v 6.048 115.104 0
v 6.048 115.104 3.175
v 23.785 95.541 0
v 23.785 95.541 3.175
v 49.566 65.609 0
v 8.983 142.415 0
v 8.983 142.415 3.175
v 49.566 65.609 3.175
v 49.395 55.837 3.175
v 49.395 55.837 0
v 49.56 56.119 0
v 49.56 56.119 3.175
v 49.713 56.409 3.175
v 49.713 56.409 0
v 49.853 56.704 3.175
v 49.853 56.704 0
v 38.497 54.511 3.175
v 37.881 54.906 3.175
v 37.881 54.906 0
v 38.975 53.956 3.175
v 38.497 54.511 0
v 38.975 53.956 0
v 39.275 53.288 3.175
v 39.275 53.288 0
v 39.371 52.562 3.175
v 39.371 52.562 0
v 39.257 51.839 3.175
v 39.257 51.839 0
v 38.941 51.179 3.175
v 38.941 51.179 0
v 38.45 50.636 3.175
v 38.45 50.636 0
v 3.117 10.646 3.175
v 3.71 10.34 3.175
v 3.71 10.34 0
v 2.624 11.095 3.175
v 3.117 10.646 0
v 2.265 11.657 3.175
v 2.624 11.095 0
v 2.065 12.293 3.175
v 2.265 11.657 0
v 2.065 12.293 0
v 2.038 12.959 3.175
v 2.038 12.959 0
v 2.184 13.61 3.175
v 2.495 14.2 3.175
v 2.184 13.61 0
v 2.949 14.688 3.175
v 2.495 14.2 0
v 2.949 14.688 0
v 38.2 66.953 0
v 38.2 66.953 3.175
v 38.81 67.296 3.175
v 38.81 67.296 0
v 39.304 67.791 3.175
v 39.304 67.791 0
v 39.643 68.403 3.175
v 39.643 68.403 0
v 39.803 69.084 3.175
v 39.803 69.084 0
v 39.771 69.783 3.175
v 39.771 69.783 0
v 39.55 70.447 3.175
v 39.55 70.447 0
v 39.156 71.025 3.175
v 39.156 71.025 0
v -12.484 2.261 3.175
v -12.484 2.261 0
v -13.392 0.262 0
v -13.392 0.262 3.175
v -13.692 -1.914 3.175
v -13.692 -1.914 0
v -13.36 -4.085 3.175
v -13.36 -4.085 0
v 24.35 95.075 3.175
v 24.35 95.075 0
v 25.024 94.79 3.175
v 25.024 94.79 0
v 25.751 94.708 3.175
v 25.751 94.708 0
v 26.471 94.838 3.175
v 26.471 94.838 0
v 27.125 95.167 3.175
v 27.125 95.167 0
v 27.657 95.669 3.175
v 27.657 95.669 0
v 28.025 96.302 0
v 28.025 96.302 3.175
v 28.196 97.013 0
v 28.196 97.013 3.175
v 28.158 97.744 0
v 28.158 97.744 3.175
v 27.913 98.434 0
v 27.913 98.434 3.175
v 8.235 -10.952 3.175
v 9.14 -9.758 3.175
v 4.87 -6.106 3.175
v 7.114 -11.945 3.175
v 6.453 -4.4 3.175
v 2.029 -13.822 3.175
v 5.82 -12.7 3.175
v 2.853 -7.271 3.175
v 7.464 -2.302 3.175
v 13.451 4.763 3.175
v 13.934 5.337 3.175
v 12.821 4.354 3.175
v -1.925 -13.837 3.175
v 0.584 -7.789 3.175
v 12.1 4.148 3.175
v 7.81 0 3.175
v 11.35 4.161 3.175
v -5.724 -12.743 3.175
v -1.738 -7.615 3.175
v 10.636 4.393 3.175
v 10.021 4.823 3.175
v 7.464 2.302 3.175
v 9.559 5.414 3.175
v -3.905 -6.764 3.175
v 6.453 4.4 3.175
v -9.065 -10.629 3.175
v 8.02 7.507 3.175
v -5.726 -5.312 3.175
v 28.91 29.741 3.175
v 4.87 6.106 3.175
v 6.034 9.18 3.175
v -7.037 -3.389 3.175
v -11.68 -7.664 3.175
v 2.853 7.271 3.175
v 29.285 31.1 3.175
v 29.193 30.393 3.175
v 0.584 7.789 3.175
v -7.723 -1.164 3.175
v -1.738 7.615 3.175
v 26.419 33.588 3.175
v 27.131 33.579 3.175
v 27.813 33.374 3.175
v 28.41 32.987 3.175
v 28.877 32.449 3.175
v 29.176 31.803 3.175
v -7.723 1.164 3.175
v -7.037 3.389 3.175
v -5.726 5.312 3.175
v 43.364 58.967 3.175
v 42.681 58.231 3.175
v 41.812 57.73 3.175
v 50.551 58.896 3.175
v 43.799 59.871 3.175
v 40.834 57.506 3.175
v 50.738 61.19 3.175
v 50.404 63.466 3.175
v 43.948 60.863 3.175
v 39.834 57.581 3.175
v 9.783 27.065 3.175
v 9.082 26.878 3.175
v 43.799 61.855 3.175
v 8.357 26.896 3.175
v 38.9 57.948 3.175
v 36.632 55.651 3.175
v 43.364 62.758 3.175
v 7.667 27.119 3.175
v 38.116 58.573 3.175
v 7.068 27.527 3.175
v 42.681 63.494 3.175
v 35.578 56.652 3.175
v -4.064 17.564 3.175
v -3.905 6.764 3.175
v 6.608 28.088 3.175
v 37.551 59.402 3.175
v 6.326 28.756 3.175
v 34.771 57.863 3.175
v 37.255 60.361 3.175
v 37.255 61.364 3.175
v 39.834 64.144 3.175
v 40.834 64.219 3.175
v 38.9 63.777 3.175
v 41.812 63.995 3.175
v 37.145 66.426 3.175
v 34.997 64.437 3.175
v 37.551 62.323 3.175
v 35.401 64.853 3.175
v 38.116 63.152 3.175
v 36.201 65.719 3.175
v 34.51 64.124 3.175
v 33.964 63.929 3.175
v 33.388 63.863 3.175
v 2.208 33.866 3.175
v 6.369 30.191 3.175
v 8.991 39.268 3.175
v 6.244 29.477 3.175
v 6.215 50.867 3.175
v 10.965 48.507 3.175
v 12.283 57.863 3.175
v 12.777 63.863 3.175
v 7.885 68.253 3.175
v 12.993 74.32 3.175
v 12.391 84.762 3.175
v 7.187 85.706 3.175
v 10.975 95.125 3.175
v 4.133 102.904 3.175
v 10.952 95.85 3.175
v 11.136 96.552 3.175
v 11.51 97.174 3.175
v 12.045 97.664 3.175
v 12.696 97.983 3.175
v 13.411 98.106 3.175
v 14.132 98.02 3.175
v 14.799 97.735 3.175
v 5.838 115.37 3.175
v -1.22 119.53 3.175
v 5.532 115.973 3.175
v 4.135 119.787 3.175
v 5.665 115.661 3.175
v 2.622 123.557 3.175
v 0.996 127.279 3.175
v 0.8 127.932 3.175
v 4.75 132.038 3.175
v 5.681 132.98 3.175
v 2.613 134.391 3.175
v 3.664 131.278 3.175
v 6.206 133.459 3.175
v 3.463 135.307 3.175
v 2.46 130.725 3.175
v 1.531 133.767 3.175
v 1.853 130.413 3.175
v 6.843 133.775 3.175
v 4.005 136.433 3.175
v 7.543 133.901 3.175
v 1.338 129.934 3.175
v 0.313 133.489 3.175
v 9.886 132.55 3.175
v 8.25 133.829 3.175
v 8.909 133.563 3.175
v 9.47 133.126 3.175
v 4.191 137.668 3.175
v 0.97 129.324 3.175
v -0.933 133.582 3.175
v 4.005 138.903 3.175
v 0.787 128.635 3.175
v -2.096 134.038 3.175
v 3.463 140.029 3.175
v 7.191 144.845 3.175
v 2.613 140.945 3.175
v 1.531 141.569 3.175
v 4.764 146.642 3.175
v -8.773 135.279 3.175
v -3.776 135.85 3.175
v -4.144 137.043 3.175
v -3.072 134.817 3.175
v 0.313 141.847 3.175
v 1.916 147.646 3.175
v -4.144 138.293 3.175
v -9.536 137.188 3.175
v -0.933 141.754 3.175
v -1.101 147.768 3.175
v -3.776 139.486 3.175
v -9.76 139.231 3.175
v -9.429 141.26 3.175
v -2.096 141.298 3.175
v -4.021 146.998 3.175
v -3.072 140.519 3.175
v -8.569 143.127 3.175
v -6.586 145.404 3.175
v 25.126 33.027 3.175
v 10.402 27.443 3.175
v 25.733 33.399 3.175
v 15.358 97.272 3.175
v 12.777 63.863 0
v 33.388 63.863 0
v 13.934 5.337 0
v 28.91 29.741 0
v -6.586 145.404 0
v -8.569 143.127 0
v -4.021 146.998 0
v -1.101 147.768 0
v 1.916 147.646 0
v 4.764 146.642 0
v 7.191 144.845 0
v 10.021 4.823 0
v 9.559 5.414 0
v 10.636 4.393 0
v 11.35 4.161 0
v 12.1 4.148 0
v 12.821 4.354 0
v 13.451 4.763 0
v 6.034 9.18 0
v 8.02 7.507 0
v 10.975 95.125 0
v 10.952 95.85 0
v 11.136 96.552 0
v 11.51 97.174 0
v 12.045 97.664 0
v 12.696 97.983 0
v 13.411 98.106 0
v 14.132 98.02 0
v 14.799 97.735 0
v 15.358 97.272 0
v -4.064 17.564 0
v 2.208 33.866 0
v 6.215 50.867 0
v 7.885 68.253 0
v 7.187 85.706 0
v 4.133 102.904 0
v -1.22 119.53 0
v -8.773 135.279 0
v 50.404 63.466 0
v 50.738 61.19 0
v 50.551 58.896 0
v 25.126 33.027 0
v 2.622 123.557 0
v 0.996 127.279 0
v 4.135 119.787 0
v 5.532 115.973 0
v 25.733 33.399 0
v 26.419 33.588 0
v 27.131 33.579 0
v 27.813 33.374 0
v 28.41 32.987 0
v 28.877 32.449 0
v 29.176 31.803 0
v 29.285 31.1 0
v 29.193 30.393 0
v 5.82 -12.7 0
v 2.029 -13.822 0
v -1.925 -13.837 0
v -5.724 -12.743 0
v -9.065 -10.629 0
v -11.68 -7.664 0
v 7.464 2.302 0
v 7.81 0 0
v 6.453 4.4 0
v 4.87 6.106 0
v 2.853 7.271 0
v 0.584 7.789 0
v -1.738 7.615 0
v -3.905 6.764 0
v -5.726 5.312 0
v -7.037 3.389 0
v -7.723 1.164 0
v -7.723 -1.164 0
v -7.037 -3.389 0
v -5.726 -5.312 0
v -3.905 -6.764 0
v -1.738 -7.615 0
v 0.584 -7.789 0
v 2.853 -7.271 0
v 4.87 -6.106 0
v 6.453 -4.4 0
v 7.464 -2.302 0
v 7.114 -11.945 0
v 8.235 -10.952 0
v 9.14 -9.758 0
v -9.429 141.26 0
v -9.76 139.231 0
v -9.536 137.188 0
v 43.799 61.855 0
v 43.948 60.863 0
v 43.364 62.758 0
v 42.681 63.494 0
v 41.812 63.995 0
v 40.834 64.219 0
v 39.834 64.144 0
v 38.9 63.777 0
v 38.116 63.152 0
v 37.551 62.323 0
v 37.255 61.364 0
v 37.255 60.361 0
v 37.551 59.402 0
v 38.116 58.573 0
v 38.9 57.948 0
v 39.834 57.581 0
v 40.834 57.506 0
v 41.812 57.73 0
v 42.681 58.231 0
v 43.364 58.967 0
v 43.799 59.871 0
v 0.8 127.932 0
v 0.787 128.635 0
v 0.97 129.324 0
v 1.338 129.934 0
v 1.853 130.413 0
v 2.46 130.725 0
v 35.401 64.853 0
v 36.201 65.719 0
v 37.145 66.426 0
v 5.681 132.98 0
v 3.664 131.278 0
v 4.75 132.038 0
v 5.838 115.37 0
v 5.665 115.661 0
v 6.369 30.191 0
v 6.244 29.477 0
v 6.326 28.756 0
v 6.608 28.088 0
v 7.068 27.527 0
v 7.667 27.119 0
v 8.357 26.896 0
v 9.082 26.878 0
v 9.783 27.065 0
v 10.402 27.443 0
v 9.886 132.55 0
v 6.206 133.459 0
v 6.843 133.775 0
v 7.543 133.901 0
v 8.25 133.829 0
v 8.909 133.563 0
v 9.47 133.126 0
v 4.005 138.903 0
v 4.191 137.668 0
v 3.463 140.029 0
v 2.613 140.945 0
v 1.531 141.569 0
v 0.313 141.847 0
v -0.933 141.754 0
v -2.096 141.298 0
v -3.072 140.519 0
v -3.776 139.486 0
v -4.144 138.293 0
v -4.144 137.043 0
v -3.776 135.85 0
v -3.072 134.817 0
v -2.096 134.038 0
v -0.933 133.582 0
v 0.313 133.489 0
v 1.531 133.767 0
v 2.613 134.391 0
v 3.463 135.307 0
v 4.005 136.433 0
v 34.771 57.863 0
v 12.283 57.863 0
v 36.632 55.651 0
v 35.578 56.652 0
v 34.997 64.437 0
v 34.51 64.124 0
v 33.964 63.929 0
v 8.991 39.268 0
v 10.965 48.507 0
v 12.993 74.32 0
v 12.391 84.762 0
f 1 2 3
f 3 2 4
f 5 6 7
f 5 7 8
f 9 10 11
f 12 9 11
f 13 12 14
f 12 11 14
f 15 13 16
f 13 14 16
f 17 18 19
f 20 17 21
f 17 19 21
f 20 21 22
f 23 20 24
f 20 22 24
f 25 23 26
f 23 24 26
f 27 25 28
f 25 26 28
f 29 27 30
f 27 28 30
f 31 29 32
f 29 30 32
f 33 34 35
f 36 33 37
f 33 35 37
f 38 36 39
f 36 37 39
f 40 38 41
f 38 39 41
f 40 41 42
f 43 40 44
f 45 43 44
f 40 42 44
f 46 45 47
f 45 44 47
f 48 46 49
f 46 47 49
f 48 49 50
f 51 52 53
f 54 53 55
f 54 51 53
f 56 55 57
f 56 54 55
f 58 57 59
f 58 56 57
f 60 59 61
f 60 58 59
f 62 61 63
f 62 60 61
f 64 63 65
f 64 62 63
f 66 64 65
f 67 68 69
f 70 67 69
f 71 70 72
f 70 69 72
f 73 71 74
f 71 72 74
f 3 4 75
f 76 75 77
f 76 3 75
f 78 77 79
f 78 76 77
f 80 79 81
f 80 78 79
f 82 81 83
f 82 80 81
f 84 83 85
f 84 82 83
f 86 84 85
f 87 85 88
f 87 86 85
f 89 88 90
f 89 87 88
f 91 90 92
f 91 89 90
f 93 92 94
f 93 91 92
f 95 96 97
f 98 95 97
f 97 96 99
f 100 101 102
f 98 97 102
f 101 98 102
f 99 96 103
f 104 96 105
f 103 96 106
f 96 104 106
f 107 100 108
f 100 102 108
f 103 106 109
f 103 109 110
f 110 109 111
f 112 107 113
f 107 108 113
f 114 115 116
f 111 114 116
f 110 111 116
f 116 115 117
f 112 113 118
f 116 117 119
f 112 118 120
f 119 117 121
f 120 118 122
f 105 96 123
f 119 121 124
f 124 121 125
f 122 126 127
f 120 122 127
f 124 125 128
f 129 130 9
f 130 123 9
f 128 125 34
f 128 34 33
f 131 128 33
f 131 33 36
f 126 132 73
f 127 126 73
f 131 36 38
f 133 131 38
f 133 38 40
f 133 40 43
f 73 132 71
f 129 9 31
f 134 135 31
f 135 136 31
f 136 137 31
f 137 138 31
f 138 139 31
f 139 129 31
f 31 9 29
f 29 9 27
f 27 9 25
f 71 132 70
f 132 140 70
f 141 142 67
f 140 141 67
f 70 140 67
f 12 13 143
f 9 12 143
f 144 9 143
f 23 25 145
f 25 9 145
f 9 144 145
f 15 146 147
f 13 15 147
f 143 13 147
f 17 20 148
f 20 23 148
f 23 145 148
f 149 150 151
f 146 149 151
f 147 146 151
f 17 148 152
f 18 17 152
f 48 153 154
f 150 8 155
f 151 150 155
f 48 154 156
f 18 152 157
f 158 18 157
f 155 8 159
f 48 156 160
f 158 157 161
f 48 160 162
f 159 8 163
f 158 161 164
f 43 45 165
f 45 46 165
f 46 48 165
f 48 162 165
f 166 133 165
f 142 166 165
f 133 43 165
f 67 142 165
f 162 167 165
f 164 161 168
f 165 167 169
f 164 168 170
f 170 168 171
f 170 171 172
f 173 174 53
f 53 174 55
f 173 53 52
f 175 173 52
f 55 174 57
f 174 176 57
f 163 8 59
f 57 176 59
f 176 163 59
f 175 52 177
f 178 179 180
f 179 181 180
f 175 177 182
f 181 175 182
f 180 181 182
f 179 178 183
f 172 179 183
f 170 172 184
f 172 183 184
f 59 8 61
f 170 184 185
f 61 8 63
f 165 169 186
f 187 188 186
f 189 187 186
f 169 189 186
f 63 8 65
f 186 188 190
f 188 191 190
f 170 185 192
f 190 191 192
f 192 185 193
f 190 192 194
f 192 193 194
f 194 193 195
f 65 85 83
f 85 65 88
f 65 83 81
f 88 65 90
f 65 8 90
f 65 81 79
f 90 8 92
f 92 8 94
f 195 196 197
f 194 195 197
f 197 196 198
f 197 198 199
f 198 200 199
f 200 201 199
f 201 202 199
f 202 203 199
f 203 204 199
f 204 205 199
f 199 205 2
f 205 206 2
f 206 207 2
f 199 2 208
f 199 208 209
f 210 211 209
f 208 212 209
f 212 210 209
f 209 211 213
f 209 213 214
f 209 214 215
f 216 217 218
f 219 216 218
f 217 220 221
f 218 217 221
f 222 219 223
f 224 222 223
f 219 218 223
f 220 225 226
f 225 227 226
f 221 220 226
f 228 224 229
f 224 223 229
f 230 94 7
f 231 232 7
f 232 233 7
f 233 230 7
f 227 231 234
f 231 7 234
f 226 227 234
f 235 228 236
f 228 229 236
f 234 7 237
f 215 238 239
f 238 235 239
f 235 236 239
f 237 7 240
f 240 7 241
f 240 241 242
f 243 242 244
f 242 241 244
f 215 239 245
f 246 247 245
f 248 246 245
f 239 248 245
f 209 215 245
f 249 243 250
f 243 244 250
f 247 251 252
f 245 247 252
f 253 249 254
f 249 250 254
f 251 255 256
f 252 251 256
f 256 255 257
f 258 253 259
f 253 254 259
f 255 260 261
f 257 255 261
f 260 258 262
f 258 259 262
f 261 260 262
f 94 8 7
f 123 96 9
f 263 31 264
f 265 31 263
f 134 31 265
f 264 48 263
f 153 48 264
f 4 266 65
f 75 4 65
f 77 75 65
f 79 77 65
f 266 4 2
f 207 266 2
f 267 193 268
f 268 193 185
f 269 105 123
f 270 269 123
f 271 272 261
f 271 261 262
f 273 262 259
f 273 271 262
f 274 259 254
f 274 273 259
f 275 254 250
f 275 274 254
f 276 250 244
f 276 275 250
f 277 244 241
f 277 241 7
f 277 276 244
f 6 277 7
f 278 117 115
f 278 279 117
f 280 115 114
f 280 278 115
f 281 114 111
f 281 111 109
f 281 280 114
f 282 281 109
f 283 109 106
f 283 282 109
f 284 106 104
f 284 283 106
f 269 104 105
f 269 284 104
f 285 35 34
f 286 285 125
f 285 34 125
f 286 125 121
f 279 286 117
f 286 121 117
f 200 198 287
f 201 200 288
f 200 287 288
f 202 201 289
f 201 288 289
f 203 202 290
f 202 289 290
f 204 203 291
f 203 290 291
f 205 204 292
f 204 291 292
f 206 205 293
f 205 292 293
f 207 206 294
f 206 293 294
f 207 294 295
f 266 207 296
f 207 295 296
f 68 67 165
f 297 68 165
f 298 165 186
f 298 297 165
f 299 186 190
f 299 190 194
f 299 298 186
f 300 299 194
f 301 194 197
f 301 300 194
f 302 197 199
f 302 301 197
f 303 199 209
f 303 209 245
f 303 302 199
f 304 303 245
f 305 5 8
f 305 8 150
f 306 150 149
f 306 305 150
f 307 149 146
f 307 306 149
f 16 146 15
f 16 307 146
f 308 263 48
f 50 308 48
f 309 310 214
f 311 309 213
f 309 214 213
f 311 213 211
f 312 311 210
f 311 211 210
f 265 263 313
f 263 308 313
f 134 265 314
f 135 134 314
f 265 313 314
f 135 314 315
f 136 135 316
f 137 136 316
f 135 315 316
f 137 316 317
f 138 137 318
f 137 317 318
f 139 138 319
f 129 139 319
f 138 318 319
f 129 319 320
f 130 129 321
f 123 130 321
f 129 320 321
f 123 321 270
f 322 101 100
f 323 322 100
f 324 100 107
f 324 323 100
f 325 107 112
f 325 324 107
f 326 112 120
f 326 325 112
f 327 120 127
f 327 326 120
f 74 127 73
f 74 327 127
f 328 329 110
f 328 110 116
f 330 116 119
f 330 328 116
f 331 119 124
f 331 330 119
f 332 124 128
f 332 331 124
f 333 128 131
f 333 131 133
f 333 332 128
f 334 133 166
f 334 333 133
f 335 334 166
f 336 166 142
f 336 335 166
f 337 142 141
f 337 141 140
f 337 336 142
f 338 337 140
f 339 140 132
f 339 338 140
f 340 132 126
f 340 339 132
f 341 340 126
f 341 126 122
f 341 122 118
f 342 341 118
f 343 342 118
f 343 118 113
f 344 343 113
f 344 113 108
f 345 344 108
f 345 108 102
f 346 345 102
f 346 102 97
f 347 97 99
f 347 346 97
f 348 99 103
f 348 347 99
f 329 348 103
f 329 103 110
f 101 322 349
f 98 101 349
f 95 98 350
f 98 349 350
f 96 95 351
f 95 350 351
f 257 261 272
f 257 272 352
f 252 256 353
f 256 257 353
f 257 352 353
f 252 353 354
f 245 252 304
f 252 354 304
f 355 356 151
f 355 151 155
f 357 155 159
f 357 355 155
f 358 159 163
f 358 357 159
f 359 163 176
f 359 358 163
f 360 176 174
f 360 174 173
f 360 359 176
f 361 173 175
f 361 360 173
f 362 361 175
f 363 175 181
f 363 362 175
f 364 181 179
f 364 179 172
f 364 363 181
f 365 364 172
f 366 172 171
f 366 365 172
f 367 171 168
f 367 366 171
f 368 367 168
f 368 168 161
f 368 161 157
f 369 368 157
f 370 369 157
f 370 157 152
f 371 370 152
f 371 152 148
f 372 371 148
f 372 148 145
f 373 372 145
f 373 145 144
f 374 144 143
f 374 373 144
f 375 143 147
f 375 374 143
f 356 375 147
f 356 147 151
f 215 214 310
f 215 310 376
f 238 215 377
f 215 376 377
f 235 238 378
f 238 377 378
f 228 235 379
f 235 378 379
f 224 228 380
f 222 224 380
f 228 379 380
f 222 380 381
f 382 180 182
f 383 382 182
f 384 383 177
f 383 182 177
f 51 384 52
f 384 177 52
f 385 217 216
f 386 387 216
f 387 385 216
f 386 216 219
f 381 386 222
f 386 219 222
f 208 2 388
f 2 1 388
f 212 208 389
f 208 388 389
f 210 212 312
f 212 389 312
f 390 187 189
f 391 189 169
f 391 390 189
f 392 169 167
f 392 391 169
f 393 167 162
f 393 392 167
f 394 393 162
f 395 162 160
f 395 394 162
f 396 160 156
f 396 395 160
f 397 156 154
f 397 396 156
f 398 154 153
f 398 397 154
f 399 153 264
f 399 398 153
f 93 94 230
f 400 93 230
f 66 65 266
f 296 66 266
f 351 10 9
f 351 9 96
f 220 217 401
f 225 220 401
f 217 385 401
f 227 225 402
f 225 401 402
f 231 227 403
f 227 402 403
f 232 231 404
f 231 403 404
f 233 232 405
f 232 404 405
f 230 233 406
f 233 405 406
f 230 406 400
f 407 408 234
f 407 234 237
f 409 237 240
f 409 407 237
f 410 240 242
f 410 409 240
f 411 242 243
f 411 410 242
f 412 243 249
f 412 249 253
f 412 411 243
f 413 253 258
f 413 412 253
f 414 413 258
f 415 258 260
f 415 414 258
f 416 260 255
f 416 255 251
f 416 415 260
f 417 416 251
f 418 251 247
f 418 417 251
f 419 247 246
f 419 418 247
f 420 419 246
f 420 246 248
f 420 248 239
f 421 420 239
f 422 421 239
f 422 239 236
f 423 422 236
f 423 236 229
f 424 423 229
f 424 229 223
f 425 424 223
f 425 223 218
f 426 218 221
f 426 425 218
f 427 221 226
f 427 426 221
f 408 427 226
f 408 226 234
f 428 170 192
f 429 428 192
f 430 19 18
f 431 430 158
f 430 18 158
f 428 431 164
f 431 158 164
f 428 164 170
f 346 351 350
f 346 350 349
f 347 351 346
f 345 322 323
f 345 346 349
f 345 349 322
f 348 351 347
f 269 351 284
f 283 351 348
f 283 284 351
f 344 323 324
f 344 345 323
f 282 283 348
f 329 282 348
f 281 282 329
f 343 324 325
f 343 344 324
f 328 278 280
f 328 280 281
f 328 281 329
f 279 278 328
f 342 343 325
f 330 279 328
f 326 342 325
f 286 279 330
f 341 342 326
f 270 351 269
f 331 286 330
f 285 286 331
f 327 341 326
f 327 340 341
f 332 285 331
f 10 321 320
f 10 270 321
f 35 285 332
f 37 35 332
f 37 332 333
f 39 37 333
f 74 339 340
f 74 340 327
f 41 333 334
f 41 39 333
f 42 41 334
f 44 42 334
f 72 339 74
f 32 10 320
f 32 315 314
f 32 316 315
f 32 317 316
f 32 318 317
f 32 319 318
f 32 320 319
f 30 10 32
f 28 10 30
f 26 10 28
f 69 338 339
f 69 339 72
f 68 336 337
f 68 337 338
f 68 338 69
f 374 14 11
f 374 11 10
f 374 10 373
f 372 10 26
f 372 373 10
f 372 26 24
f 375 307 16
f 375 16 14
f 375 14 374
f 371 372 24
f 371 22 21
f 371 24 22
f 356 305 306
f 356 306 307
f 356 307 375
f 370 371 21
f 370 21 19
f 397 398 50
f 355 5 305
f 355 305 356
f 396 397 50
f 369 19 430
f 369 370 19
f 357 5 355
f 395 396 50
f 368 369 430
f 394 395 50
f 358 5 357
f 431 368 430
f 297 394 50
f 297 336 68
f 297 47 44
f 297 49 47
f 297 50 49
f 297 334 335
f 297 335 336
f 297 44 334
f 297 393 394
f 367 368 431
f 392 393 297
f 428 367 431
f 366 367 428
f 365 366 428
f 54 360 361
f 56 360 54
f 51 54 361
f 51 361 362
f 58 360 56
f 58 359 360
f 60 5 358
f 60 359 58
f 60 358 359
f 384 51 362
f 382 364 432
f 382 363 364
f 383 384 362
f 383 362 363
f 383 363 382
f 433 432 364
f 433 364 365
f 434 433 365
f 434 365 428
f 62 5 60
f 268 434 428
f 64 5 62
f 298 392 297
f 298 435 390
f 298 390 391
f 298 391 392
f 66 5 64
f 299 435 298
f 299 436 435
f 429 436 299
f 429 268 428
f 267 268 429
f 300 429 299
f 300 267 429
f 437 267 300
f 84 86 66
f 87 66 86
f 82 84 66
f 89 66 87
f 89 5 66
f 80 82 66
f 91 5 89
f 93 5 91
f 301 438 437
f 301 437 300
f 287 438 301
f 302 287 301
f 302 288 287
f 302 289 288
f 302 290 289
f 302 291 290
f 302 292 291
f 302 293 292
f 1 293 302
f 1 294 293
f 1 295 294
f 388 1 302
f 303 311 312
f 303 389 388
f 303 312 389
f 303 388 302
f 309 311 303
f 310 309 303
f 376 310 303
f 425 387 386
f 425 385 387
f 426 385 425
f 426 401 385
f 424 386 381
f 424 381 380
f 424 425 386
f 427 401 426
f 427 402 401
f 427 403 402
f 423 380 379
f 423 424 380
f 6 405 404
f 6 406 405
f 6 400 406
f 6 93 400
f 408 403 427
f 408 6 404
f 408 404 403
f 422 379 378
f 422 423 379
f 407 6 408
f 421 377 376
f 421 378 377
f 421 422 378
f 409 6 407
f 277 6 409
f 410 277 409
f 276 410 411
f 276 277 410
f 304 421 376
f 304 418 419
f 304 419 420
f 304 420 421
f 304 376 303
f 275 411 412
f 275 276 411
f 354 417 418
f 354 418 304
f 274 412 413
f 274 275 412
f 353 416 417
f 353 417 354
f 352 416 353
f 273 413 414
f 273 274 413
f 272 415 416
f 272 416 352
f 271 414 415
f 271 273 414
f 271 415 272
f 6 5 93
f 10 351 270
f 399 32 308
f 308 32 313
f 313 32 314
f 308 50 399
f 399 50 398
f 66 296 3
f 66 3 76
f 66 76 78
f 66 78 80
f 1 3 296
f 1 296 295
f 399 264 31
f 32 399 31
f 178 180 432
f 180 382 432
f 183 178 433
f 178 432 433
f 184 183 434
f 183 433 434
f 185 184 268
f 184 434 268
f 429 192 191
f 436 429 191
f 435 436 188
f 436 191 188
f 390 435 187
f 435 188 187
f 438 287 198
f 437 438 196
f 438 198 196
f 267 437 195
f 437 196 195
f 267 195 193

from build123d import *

# Parameters (mm, degrees)
SKETCH1_R           = 7.8105
SKETCH1_R_2         = 3.3655
SKETCH1_R_3         = 4.191
BOSS_EXTRUDE1_DEPTH = 3.175
CUT_EXTRUDE1_DEPTH  = 6.35
FILLET1_R           = 2.54
FILLET5_R           = 7.62


with BuildPart() as part:
    # Sketch1 → Boss-Extrude1 (new body)
    with BuildSketch(Plane.XY):
        with BuildLine():
            Line((8.98309661, 142.414532976), (49.565953559, 65.609056962))
            ThreePointArc((49.565953559, 65.609056962), (50.742856949, 60.862523985), (49.565953559, 56.115991009))
            Line((49.565953559, 56.115991009), (8.177790267, -11.326281223))
            ThreePointArc((8.177790267, -11.326281223), (-6.360706327, -12.437938536), (-13.97, 0))
            ThreePointArc((-13.97, 0), (7.886144716, 68.281846548), (-10.16, 137.668))
            ThreePointArc((-10.16, 137.668), (-2.445131739, 147.529385845), (8.98309661, 142.414532976))
        make_face()
        Circle(SKETCH1_R, mode=Mode.SUBTRACT)
        with Locations((40.582856949, 60.862523985)):
            Circle(SKETCH1_R_2, mode=Mode.SUBTRACT)
        with Locations((0, 137.668)):
            Circle(SKETCH1_R_3, mode=Mode.SUBTRACT)
    extrude(amount=BOSS_EXTRUDE1_DEPTH)

    # Sketch2 → Cut-Extrude1 (cut)
    with BuildSketch(Plane.XY.offset(3.175)):
        with BuildLine():
            ThreePointArc((-1.687172275, 10.855167431), (6.949528794, 8.507952738), (10.973487677, 0.513593659))
            Line((10.973487677, 0.513593659), (36.90141673, 42.763317023))
            Line((36.90141673, 42.763317023), (-1.687172275, 10.855167431))
        make_face()
        with BuildLine():
            ThreePointArc((12.283170574, 57.862523985), (9.009504683, 39.343064628), (3.172468256, 21.465249632))
            Line((3.172468256, 21.465249632), (44.364286203, 55.525958325))
            ThreePointArc((44.364286203, 55.525958325), (39.035089517, 54.507796908), (34.770960507, 57.862523985))
            Line((34.770960507, 57.862523985), (12.283170574, 57.862523985))
        make_face()
        with BuildLine():
            Line((5.700051608, 115.487969959), (37.341521976, 80.589180404))
            Line((37.341521976, 80.589180404), (7.358422957, 137.33398266))
            ThreePointArc((7.358422957, 137.33398266), (4.930965477, 132.195931336), (-0.431201431, 130.314631974))
            ThreePointArc((-0.431201431, 130.314631974), (2.856784408, 122.993252968), (5.700051608, 115.487969959))
        make_face()
        with BuildLine():
            ThreePointArc((34.770960507, 63.862523985), (38.185315424, 66.94774665), (42.786522834, 67.020607852))
            Line((42.786522834, 67.020607852), (9.033823823, 104.247965684))
            ThreePointArc((9.033823823, 104.247965684), (12.444109183, 84.197859008), (12.777235899, 63.862523985))
            Line((12.777235899, 63.862523985), (34.770960507, 63.862523985))
        make_face()
    extrude(amount=-CUT_EXTRUDE1_DEPTH, mode=Mode.SUBTRACT)

    # Fillet1
    fillet1_edges = [part.edges().sort_by_distance(p)[0] for p in [
        (44.364286203, 55.525958325, 1.5875),
        (3.172468256, 21.465249632, 1.5875),
        (42.786522834, 67.020607852, 1.5875),
        (34.770960507, 63.862523985, 1.5875),
        (9.033823823, 104.247965684, 1.5875),
        (-0.431201431, 130.314631974, 1.5875),
        (7.358422957, 137.33398266, 1.5875),
        (37.341521976, 80.589180404, 1.5875),
        (5.700051608, 115.487969959, 1.5875),
        (10.973487677, 0.513593659, 1.5875),
        (-1.687172275, 10.855167431, 1.5875),
        (36.90141673, 42.763317023, 1.5875),
    ]]
    fillet(fillet1_edges, radius=FILLET1_R)

    # Fillet5
    # the kernel refuses this fillet: 7.62 mm, written as the material it takes off along each edge
    with BuildSketch(Plane(origin=(49.565953559, 56.115991009, -1.635210381), x_dir=(0.4384758636480836, 0.8987429649227121, 0), z_dir=(0, 0, 1))) as fillet5_piece_1:
        with BuildLine():
            CenterArc((0.408802595, 7.616051271), FILLET5_R, 264.46995043, 7.374672414)
            Line((-0.325519955, 0.031516322), (0, 0))
            ThreePointArc((0, 0), (0.327042076, -0.005264972), (0.654084152, 0))
        make_face()
    extrude(amount=6.445420761, mode=Mode.SUBTRACT)
    with BuildSketch(Plane(origin=(8.177790267, -11.326281223, -6.821790927), x_dir=(-0.8640520418582298, -0.5034024920087542, 0), z_dir=(0, 0, 1))) as fillet5_piece_2:
        with BuildLine():
            CenterArc((1.984520997, -7.583572591), FILLET5_R, 84.39536353, 33.842547752)
            Line((-1.620758554, -0.870424346), (0, 0))
            ThreePointArc((0, 0), (1.364358185, 0.066783583), (2.728716371, 0))
        make_face()
    extrude(amount=16.818581854, mode=Mode.SUBTRACT)
    with BuildSketch(Plane(origin=(-13.97, 0, -10.324988133), x_dir=(0.5491862360699723, 0.8356999928869789, 0), z_dir=(0, 0, 1))) as fillet5_piece_3:
        with BuildLine():
            CenterArc((2.785592727, -7.619579496), FILLET5_R, 90.601931521, 49.710102388)
            ThreePointArc((-3.078254062, -2.753400211), (-1.641438538, -1.262317601), (0, 0))
            ThreePointArc((0, 0), (1.352770433, -0.007105957), (2.705540865, 0))
        make_face()
    extrude(amount=23.824976265, mode=Mode.SUBTRACT)
    with BuildSketch(Plane(origin=(-10.16, 137.668, -14.214457568), x_dir=(0.2798121568434471, 0.96005476764746, 0), z_dir=(0, 0, 1))) as fillet5_piece_4:
        with BuildLine():
            CenterArc((3.553614392, -7.315617329), FILLET5_R, 73.751006034, 62.011444153)
            ThreePointArc((-1.90576169, -1.999640205), (-0.947518647, -1.004930558), (0, 0))
            ThreePointArc((0, 0), (2.842891514, 0.405843561), (5.685783027, 0))
        make_face()
    extrude(amount=31.603915135, mode=Mode.SUBTRACT)


solid = part.part
